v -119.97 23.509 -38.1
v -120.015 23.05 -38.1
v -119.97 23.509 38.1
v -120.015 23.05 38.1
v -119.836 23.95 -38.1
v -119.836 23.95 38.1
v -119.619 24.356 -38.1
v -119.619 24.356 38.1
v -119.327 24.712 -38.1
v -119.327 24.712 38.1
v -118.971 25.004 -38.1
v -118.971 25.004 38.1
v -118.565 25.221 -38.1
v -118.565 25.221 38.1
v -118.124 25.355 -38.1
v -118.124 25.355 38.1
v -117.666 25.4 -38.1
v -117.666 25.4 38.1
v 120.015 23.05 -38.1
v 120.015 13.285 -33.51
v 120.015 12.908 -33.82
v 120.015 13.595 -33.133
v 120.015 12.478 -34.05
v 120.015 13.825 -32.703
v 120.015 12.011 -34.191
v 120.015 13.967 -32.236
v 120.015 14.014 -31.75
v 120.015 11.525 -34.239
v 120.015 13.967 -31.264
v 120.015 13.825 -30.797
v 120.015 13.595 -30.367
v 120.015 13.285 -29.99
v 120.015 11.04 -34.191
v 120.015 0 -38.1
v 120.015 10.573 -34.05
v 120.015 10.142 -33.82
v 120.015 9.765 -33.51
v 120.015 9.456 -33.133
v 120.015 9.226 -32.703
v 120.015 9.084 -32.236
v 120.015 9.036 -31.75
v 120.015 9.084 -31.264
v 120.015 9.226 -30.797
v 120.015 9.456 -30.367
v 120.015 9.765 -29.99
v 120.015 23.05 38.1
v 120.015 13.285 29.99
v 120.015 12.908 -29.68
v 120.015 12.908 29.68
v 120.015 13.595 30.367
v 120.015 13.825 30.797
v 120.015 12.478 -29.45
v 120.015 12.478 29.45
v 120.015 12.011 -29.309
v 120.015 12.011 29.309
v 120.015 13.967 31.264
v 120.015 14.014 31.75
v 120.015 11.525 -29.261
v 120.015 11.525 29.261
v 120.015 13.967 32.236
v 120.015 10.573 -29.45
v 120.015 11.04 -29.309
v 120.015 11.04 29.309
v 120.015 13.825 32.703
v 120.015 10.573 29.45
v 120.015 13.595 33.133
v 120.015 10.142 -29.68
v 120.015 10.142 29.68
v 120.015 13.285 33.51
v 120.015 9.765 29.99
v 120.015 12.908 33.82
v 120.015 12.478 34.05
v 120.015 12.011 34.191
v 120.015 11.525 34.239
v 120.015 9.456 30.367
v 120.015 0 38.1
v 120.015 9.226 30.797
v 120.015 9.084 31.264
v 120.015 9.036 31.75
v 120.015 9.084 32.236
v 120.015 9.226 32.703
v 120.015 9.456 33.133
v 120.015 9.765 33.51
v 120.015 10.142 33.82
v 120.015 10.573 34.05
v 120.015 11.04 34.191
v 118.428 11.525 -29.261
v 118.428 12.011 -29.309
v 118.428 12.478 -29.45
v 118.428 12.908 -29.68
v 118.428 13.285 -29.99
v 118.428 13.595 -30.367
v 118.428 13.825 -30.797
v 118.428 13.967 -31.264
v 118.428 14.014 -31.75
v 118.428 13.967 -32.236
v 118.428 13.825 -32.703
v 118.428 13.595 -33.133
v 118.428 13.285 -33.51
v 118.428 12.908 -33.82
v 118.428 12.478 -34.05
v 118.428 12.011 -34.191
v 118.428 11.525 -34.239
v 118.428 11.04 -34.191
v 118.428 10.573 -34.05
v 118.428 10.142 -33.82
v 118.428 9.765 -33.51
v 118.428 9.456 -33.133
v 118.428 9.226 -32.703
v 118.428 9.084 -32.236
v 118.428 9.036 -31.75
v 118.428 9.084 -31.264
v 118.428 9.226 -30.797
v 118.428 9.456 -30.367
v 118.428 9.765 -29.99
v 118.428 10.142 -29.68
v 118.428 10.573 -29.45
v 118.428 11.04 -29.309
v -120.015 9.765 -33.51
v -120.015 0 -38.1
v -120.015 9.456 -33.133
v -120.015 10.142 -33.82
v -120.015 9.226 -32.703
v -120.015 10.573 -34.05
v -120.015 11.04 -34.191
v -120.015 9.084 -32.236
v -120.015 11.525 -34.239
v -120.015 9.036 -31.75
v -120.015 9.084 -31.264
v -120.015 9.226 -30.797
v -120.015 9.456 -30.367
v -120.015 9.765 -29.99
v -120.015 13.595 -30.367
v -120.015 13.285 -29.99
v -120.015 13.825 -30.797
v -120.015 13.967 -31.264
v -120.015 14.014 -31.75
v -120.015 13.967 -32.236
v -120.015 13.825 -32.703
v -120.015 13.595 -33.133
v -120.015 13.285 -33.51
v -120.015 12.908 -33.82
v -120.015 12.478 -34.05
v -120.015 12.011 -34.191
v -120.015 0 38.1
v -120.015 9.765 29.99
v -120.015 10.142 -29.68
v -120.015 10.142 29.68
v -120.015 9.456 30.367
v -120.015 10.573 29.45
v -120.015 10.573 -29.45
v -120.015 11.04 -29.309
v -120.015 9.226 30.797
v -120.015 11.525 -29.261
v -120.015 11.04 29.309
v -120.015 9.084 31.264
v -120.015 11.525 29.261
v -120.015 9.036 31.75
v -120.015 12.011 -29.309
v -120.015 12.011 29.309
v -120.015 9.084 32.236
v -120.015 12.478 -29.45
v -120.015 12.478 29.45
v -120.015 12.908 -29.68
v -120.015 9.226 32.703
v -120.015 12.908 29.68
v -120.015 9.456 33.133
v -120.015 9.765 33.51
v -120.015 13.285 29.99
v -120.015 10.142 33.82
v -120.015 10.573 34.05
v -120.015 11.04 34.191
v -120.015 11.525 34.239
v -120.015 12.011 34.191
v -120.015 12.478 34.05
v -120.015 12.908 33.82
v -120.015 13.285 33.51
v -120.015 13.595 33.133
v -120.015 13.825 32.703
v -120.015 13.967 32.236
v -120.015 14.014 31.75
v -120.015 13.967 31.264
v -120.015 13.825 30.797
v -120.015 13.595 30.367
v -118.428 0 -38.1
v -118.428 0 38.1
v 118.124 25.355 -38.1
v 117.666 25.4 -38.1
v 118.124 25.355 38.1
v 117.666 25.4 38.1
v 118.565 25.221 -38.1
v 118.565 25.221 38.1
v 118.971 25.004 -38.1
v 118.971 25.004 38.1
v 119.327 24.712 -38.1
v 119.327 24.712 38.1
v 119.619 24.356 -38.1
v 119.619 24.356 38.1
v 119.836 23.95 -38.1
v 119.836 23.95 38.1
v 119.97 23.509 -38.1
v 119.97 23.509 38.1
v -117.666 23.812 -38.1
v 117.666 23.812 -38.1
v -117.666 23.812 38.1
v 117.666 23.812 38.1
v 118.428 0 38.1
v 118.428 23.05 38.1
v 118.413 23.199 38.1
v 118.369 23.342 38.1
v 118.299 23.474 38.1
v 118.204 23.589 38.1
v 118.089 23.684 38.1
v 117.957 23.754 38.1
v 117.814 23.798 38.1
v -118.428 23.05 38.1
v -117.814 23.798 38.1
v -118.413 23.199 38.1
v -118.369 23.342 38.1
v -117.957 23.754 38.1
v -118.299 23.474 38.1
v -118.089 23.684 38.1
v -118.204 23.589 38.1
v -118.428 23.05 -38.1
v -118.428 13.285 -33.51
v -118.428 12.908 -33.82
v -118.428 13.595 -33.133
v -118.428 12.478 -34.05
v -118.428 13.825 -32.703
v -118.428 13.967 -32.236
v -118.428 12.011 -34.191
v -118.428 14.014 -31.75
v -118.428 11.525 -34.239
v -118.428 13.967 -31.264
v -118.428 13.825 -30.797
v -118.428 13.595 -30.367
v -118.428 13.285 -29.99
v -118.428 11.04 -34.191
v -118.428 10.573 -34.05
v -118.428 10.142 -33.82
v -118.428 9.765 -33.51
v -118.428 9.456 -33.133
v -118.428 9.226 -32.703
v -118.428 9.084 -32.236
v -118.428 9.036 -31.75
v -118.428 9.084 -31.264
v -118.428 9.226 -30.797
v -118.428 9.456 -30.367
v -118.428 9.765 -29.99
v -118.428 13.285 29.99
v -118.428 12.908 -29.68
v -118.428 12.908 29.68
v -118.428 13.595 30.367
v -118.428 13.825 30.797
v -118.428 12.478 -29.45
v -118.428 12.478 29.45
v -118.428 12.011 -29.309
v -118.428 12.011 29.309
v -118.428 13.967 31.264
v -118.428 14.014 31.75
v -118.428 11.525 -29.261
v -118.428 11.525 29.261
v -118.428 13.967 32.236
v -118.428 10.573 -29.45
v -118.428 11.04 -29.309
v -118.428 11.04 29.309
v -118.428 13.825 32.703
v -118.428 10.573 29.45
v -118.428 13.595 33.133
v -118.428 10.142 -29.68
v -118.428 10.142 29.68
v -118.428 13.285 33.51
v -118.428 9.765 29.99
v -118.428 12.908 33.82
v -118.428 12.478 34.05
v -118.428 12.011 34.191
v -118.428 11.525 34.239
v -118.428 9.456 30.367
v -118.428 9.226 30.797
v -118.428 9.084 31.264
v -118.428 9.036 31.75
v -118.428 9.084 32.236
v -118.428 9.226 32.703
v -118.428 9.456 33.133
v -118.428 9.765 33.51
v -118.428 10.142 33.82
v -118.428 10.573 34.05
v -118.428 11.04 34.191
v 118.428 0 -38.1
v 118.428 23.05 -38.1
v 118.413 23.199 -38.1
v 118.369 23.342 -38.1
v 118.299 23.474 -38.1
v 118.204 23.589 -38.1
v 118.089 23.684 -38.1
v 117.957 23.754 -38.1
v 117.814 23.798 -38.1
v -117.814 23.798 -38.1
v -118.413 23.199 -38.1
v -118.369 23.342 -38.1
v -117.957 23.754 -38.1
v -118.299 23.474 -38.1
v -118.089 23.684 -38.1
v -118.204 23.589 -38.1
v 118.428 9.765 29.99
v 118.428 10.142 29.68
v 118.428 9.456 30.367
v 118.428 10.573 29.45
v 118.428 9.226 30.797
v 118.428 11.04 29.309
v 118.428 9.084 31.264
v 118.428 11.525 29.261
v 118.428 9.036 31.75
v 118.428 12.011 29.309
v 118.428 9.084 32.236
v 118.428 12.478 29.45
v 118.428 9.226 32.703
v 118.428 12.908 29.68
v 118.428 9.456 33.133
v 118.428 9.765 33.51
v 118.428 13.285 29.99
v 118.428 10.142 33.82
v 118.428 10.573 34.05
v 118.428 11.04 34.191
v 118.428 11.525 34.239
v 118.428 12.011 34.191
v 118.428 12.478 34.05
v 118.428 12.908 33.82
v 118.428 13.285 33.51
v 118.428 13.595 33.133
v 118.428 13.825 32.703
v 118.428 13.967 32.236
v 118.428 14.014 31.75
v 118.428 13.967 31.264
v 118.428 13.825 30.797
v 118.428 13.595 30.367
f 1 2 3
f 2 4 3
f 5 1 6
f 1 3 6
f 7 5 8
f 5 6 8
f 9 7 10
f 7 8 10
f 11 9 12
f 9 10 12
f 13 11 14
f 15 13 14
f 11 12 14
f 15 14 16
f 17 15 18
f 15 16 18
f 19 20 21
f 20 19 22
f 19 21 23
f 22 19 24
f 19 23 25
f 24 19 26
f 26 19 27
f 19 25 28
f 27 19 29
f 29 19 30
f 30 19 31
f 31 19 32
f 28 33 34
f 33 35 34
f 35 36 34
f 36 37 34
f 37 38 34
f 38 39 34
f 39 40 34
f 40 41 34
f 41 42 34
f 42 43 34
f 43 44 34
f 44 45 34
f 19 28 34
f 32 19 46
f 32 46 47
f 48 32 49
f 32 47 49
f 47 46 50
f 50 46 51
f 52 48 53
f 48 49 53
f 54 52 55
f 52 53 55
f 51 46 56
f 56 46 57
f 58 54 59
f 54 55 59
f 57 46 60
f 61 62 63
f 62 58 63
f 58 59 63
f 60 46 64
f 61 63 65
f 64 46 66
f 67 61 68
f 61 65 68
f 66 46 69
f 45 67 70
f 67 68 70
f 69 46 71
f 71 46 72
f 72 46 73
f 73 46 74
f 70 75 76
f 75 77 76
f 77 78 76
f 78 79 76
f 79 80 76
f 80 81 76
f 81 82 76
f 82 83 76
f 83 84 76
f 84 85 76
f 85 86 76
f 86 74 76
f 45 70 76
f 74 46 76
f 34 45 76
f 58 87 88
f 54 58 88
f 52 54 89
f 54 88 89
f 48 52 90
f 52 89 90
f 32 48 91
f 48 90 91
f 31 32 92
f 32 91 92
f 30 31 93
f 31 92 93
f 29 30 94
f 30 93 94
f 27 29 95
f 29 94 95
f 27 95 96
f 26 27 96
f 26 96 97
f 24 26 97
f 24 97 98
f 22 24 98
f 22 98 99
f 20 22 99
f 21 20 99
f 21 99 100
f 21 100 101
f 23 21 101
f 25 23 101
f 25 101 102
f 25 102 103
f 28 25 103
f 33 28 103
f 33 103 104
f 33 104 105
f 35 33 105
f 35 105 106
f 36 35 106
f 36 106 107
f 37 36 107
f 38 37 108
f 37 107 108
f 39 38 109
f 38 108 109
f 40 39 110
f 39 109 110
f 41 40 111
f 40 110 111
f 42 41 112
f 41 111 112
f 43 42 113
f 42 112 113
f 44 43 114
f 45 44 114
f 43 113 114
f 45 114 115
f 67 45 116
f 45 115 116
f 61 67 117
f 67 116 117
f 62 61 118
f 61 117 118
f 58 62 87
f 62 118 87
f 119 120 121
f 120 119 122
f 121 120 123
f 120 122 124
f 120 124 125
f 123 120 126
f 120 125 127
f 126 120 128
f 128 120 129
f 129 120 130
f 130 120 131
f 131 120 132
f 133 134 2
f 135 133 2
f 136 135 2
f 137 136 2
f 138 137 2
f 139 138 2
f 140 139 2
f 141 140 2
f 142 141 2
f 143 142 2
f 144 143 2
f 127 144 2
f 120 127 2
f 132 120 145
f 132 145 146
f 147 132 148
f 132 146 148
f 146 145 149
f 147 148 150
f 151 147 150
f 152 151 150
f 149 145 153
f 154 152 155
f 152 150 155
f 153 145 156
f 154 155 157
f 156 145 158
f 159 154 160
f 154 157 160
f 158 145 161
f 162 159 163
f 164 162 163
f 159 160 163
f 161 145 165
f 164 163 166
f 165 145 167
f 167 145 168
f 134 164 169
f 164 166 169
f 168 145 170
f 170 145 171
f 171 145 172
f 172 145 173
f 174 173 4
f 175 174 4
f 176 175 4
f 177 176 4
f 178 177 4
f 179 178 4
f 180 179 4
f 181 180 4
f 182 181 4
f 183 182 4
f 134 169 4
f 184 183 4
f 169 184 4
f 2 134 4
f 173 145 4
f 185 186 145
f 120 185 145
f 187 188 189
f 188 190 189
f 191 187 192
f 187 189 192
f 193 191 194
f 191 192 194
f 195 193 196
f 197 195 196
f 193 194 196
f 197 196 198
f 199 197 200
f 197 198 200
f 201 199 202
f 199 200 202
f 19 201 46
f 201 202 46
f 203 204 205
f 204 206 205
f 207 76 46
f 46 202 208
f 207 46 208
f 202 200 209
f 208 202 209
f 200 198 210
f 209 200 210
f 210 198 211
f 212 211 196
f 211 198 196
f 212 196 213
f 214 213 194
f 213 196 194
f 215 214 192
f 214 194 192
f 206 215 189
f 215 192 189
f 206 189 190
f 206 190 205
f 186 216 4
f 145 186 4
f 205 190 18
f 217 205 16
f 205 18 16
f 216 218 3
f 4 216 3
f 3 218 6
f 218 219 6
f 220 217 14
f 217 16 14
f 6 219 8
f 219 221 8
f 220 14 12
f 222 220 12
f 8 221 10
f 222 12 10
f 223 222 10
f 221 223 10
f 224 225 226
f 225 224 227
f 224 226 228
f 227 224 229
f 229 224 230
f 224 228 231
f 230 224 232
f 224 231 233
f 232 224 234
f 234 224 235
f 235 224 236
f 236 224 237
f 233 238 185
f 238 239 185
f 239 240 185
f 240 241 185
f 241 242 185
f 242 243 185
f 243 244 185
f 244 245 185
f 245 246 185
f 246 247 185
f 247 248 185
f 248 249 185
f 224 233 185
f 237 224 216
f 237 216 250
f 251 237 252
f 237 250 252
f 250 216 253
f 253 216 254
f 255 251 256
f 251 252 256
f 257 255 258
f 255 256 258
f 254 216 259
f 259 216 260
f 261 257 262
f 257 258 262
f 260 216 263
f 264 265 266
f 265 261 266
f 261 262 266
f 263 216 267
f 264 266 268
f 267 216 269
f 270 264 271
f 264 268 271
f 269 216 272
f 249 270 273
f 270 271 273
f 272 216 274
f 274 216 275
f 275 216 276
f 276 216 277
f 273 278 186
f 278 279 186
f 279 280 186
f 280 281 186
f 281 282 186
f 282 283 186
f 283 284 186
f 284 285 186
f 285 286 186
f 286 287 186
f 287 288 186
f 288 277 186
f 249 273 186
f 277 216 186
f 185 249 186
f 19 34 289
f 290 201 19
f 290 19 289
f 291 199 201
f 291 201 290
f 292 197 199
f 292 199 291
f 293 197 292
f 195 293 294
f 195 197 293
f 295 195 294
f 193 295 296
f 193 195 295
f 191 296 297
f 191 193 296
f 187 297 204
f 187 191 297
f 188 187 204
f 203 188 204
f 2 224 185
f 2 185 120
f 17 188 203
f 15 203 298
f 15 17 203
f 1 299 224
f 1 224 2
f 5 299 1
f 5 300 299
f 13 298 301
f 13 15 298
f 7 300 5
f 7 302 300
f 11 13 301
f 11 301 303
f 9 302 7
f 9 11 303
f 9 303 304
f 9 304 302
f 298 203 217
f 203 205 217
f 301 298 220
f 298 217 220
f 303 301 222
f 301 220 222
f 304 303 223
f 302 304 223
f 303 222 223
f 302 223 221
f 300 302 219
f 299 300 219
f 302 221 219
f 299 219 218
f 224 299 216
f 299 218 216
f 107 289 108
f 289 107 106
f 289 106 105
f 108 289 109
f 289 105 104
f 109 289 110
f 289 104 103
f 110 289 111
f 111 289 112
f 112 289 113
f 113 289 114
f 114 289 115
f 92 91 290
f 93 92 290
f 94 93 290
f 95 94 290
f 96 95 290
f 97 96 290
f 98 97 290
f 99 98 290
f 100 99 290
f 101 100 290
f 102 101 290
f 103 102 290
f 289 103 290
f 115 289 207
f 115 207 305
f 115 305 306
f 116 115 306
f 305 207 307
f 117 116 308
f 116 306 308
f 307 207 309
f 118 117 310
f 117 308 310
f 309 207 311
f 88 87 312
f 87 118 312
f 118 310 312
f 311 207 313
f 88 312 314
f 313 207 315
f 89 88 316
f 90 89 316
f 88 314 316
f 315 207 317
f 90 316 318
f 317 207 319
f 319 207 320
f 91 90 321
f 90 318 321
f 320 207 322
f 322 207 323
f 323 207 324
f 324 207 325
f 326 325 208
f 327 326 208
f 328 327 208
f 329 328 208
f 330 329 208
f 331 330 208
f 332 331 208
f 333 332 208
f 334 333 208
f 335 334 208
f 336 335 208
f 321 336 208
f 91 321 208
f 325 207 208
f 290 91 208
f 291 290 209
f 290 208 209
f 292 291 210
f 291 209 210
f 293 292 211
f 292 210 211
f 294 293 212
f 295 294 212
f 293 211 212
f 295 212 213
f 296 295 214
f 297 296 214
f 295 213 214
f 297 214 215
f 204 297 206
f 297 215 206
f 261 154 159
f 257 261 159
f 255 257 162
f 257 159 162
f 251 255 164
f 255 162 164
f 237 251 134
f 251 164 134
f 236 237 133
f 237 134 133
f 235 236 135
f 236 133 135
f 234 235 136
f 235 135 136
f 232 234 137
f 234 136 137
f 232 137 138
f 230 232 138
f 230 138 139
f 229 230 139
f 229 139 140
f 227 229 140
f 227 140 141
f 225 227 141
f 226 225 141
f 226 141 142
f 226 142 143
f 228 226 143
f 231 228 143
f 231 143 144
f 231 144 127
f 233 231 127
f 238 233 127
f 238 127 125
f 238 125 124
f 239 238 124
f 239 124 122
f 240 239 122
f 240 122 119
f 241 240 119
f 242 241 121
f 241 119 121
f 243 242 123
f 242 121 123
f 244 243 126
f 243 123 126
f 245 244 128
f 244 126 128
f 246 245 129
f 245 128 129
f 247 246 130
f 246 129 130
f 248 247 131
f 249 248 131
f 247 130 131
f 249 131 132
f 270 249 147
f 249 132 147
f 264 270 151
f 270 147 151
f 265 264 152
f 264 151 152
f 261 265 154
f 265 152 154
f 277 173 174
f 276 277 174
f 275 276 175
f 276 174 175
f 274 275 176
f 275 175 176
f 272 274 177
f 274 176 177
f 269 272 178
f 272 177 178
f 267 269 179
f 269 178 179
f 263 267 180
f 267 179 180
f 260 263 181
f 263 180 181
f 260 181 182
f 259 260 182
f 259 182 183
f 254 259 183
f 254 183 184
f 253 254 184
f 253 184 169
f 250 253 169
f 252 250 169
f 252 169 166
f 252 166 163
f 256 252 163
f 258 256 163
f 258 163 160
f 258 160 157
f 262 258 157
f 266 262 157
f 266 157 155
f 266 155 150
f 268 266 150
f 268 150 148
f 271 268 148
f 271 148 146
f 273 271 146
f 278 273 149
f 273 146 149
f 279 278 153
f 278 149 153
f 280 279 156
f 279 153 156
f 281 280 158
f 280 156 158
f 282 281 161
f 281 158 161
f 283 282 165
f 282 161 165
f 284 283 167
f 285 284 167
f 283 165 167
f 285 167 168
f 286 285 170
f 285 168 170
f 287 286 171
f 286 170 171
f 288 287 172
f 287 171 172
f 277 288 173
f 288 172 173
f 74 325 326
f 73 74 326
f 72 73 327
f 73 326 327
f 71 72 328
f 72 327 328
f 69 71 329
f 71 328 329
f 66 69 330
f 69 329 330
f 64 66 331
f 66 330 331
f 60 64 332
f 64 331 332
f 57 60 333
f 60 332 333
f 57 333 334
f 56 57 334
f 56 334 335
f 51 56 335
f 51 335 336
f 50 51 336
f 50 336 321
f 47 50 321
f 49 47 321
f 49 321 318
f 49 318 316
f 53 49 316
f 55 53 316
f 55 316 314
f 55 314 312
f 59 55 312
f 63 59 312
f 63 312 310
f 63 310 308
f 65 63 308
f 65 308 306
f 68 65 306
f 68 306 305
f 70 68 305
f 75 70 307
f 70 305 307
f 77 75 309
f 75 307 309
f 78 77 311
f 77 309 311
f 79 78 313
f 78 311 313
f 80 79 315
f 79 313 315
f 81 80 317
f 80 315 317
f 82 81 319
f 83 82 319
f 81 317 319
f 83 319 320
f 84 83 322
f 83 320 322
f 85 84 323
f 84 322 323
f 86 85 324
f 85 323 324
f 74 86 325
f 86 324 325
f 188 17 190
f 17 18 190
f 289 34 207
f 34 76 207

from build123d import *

# Parameters (mm, degrees)
BASE_FLANGE1_DEPTH = 38.1
SKETCH6_R          = 2.4892
CUT_EXTRUDE1_DEPTH = 245.358693113


# Sheet-metal steps are written as plain solids
with BuildPart() as part:
    # Sketch1 → Base-Flange1 (new, symmetric)
    with BuildSketch(Plane.XY):
        with BuildLine():
            Line((-120.015, 0), (-120.015, 23.0505))
            ThreePointArc((-120.015, 23.0505), (-119.326847382, 24.711847382), (-117.6655, 25.4))
            Line((-117.6655, 25.4), (117.6655, 25.4))
            ThreePointArc((117.6655, 25.4), (119.326847382, 24.711847382), (120.015, 23.0505))
            Line((120.015, 23.0505), (120.015, 0))
            Line((120.015, 0), (118.4275, 0))
            Line((118.4275, 0), (118.4275, 23.0505))
            ThreePointArc((118.4275, 23.0505), (118.204315367, 23.589315367), (117.6655, 23.8125))
            Line((117.6655, 23.8125), (-117.6655, 23.8125))
            ThreePointArc((-117.6655, 23.8125), (-118.204315367, 23.589315367), (-118.4275, 23.0505))
            Line((-118.4275, 23.0505), (-118.4275, 0))
            Line((-118.4275, 0), (-120.015, 0))
        make_face()
    extrude(amount=BASE_FLANGE1_DEPTH, both=True)

    # Sketch6 → Cut-Extrude1 (cut, through all)
    with BuildSketch(Plane.ZY.offset(120.015)):
        with Locations((-31.75, 11.52525)):
            Circle(SKETCH6_R)
        with Locations((31.75, 11.52525)):
            Circle(SKETCH6_R)
    extrude(amount=-CUT_EXTRUDE1_DEPTH, mode=Mode.SUBTRACT)


solid = part.part
